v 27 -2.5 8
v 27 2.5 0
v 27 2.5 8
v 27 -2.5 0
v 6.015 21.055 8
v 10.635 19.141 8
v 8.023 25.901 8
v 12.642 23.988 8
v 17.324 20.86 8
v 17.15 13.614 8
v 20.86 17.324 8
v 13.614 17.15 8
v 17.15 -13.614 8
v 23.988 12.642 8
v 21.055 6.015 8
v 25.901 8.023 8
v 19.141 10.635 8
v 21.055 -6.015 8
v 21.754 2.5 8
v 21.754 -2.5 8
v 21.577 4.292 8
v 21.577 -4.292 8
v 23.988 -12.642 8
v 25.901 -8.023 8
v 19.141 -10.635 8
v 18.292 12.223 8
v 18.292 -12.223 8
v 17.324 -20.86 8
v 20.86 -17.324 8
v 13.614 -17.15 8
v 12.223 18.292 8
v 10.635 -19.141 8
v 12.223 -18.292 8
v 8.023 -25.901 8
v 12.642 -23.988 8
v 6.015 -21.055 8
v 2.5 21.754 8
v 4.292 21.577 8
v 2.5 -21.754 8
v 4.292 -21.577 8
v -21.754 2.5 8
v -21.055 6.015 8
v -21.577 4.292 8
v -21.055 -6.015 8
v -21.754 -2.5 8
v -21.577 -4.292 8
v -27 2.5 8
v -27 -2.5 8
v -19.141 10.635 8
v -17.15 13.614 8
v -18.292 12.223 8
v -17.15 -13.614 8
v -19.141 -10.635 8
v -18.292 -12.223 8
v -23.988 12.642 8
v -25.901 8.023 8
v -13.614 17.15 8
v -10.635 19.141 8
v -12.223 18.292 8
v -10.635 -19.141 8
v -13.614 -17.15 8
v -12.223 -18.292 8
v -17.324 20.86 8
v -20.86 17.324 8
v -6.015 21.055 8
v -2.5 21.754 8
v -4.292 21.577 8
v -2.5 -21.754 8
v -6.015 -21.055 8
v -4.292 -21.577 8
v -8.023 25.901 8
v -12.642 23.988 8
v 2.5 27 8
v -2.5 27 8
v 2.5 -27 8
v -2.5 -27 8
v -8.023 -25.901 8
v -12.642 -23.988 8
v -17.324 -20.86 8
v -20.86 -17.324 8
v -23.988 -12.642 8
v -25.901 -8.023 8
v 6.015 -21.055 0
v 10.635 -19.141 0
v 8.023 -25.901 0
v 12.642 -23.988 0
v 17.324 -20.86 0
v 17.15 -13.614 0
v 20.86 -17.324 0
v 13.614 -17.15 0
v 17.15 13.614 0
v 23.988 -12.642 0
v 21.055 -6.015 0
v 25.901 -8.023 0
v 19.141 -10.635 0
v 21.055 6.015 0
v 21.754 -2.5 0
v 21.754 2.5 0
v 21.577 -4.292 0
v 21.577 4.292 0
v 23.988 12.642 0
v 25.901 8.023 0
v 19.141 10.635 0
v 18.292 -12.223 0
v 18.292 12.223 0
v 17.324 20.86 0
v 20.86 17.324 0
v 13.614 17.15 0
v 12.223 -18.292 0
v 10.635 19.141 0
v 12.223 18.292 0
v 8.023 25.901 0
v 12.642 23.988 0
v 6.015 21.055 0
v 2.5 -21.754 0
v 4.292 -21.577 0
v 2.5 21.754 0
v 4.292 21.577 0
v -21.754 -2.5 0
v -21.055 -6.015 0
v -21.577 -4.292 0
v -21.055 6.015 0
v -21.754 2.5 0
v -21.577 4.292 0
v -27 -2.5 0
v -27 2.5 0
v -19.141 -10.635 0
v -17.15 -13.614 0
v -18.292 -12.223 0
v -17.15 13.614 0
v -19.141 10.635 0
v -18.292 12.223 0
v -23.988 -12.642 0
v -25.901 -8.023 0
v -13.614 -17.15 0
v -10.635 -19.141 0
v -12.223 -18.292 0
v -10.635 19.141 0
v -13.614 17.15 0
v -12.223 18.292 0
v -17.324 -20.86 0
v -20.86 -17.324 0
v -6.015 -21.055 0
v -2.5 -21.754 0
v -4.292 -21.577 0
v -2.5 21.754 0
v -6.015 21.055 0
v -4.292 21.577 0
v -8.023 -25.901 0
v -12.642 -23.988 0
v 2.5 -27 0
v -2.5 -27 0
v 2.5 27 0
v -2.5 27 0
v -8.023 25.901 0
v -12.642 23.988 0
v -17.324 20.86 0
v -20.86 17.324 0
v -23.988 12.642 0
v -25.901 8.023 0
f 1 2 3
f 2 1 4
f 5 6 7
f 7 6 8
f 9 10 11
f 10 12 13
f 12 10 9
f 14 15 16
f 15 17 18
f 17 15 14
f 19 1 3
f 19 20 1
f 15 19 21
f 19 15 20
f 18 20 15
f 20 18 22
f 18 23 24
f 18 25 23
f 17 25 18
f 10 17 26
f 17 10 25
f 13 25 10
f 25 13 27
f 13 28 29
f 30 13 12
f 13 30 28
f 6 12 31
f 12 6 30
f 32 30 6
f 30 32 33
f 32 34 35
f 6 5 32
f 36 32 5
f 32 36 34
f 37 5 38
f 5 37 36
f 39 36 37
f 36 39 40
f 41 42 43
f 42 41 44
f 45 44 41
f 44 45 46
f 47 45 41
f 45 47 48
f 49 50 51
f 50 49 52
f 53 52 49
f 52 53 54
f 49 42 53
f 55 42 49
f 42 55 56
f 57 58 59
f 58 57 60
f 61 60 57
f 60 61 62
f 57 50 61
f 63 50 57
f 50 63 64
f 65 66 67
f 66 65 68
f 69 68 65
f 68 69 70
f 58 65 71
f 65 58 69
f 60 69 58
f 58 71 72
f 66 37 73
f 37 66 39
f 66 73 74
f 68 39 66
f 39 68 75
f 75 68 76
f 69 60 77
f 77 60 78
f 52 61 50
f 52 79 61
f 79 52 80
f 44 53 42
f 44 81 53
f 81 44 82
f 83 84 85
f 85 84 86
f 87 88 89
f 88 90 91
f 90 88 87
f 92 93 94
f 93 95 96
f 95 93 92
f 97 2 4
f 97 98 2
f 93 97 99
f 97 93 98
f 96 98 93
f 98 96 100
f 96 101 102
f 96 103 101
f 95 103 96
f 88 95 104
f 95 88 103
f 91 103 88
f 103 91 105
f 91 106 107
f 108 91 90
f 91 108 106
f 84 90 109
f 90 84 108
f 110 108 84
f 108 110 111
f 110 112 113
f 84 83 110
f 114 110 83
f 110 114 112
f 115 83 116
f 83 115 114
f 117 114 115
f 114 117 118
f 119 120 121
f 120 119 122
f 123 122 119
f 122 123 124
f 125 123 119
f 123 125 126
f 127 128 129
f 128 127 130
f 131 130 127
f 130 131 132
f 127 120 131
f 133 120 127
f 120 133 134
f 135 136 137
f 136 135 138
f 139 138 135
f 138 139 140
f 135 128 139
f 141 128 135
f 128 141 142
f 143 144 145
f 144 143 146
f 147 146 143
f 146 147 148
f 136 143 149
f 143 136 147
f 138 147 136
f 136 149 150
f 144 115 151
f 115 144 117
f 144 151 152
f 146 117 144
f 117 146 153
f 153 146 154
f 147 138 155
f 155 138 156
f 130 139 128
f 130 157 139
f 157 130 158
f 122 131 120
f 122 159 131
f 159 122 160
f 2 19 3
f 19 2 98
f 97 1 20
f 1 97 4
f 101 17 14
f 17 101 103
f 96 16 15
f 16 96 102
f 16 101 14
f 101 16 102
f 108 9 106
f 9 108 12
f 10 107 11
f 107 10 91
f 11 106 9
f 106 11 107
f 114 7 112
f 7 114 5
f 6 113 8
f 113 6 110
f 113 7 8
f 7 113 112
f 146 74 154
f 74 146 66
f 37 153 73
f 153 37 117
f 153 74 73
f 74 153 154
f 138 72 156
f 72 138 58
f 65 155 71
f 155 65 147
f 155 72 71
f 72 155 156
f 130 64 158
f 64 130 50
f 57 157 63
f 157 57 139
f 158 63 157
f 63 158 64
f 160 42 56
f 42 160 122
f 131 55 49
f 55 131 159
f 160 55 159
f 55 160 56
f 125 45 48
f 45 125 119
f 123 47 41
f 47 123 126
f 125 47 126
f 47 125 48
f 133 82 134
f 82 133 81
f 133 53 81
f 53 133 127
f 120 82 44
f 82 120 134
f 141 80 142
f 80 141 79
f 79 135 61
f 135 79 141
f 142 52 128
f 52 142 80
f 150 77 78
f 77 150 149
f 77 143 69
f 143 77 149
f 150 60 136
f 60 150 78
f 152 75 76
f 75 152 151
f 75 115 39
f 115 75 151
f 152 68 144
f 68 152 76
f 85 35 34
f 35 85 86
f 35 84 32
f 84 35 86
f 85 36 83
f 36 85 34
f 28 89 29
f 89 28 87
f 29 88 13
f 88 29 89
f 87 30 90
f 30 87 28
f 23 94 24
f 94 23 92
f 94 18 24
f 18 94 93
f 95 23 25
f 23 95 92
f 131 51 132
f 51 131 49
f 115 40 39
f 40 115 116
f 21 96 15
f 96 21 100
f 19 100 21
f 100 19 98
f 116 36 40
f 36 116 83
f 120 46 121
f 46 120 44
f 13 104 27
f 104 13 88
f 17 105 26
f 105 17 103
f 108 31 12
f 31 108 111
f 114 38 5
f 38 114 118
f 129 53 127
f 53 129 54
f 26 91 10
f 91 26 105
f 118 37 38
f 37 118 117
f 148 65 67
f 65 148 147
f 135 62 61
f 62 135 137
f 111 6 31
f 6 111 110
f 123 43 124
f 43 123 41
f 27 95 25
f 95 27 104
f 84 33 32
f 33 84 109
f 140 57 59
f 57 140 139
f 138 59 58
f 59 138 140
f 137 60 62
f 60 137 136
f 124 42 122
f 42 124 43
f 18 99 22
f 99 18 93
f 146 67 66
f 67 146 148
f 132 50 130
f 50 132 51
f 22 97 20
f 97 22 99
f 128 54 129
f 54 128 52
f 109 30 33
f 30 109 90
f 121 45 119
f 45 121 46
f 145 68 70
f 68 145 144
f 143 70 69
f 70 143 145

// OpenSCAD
$fn = 32;

// ----------------------------------------------------------------------
// Spur blank: plain gear blank
// ----------------------------------------------------------------------

// --- parameters (mm) ---
disc_r = 22;              // blank root radius
disc_t = 8;               // blank thickness
n_teeth = 16;             // stub tooth count
tooth_w = 5;              // tooth width at the root
tooth_h = 5;              // tooth height above the root

out_r = disc_r + tooth_h;  // tip radius
bbox_x = 54.0;  // measured width over the teeth
bbox_y = 54.0;  // measured depth over the teeth

union() {
  cylinder(r = disc_r, h = disc_t);
  for (i = [0 : n_teeth - 1])
    rotate([0, 0, i * 360 / n_teeth])
      translate([disc_r - 1, -tooth_w / 2, 0])
        cube([tooth_h + 1, tooth_w, disc_t]);
}
